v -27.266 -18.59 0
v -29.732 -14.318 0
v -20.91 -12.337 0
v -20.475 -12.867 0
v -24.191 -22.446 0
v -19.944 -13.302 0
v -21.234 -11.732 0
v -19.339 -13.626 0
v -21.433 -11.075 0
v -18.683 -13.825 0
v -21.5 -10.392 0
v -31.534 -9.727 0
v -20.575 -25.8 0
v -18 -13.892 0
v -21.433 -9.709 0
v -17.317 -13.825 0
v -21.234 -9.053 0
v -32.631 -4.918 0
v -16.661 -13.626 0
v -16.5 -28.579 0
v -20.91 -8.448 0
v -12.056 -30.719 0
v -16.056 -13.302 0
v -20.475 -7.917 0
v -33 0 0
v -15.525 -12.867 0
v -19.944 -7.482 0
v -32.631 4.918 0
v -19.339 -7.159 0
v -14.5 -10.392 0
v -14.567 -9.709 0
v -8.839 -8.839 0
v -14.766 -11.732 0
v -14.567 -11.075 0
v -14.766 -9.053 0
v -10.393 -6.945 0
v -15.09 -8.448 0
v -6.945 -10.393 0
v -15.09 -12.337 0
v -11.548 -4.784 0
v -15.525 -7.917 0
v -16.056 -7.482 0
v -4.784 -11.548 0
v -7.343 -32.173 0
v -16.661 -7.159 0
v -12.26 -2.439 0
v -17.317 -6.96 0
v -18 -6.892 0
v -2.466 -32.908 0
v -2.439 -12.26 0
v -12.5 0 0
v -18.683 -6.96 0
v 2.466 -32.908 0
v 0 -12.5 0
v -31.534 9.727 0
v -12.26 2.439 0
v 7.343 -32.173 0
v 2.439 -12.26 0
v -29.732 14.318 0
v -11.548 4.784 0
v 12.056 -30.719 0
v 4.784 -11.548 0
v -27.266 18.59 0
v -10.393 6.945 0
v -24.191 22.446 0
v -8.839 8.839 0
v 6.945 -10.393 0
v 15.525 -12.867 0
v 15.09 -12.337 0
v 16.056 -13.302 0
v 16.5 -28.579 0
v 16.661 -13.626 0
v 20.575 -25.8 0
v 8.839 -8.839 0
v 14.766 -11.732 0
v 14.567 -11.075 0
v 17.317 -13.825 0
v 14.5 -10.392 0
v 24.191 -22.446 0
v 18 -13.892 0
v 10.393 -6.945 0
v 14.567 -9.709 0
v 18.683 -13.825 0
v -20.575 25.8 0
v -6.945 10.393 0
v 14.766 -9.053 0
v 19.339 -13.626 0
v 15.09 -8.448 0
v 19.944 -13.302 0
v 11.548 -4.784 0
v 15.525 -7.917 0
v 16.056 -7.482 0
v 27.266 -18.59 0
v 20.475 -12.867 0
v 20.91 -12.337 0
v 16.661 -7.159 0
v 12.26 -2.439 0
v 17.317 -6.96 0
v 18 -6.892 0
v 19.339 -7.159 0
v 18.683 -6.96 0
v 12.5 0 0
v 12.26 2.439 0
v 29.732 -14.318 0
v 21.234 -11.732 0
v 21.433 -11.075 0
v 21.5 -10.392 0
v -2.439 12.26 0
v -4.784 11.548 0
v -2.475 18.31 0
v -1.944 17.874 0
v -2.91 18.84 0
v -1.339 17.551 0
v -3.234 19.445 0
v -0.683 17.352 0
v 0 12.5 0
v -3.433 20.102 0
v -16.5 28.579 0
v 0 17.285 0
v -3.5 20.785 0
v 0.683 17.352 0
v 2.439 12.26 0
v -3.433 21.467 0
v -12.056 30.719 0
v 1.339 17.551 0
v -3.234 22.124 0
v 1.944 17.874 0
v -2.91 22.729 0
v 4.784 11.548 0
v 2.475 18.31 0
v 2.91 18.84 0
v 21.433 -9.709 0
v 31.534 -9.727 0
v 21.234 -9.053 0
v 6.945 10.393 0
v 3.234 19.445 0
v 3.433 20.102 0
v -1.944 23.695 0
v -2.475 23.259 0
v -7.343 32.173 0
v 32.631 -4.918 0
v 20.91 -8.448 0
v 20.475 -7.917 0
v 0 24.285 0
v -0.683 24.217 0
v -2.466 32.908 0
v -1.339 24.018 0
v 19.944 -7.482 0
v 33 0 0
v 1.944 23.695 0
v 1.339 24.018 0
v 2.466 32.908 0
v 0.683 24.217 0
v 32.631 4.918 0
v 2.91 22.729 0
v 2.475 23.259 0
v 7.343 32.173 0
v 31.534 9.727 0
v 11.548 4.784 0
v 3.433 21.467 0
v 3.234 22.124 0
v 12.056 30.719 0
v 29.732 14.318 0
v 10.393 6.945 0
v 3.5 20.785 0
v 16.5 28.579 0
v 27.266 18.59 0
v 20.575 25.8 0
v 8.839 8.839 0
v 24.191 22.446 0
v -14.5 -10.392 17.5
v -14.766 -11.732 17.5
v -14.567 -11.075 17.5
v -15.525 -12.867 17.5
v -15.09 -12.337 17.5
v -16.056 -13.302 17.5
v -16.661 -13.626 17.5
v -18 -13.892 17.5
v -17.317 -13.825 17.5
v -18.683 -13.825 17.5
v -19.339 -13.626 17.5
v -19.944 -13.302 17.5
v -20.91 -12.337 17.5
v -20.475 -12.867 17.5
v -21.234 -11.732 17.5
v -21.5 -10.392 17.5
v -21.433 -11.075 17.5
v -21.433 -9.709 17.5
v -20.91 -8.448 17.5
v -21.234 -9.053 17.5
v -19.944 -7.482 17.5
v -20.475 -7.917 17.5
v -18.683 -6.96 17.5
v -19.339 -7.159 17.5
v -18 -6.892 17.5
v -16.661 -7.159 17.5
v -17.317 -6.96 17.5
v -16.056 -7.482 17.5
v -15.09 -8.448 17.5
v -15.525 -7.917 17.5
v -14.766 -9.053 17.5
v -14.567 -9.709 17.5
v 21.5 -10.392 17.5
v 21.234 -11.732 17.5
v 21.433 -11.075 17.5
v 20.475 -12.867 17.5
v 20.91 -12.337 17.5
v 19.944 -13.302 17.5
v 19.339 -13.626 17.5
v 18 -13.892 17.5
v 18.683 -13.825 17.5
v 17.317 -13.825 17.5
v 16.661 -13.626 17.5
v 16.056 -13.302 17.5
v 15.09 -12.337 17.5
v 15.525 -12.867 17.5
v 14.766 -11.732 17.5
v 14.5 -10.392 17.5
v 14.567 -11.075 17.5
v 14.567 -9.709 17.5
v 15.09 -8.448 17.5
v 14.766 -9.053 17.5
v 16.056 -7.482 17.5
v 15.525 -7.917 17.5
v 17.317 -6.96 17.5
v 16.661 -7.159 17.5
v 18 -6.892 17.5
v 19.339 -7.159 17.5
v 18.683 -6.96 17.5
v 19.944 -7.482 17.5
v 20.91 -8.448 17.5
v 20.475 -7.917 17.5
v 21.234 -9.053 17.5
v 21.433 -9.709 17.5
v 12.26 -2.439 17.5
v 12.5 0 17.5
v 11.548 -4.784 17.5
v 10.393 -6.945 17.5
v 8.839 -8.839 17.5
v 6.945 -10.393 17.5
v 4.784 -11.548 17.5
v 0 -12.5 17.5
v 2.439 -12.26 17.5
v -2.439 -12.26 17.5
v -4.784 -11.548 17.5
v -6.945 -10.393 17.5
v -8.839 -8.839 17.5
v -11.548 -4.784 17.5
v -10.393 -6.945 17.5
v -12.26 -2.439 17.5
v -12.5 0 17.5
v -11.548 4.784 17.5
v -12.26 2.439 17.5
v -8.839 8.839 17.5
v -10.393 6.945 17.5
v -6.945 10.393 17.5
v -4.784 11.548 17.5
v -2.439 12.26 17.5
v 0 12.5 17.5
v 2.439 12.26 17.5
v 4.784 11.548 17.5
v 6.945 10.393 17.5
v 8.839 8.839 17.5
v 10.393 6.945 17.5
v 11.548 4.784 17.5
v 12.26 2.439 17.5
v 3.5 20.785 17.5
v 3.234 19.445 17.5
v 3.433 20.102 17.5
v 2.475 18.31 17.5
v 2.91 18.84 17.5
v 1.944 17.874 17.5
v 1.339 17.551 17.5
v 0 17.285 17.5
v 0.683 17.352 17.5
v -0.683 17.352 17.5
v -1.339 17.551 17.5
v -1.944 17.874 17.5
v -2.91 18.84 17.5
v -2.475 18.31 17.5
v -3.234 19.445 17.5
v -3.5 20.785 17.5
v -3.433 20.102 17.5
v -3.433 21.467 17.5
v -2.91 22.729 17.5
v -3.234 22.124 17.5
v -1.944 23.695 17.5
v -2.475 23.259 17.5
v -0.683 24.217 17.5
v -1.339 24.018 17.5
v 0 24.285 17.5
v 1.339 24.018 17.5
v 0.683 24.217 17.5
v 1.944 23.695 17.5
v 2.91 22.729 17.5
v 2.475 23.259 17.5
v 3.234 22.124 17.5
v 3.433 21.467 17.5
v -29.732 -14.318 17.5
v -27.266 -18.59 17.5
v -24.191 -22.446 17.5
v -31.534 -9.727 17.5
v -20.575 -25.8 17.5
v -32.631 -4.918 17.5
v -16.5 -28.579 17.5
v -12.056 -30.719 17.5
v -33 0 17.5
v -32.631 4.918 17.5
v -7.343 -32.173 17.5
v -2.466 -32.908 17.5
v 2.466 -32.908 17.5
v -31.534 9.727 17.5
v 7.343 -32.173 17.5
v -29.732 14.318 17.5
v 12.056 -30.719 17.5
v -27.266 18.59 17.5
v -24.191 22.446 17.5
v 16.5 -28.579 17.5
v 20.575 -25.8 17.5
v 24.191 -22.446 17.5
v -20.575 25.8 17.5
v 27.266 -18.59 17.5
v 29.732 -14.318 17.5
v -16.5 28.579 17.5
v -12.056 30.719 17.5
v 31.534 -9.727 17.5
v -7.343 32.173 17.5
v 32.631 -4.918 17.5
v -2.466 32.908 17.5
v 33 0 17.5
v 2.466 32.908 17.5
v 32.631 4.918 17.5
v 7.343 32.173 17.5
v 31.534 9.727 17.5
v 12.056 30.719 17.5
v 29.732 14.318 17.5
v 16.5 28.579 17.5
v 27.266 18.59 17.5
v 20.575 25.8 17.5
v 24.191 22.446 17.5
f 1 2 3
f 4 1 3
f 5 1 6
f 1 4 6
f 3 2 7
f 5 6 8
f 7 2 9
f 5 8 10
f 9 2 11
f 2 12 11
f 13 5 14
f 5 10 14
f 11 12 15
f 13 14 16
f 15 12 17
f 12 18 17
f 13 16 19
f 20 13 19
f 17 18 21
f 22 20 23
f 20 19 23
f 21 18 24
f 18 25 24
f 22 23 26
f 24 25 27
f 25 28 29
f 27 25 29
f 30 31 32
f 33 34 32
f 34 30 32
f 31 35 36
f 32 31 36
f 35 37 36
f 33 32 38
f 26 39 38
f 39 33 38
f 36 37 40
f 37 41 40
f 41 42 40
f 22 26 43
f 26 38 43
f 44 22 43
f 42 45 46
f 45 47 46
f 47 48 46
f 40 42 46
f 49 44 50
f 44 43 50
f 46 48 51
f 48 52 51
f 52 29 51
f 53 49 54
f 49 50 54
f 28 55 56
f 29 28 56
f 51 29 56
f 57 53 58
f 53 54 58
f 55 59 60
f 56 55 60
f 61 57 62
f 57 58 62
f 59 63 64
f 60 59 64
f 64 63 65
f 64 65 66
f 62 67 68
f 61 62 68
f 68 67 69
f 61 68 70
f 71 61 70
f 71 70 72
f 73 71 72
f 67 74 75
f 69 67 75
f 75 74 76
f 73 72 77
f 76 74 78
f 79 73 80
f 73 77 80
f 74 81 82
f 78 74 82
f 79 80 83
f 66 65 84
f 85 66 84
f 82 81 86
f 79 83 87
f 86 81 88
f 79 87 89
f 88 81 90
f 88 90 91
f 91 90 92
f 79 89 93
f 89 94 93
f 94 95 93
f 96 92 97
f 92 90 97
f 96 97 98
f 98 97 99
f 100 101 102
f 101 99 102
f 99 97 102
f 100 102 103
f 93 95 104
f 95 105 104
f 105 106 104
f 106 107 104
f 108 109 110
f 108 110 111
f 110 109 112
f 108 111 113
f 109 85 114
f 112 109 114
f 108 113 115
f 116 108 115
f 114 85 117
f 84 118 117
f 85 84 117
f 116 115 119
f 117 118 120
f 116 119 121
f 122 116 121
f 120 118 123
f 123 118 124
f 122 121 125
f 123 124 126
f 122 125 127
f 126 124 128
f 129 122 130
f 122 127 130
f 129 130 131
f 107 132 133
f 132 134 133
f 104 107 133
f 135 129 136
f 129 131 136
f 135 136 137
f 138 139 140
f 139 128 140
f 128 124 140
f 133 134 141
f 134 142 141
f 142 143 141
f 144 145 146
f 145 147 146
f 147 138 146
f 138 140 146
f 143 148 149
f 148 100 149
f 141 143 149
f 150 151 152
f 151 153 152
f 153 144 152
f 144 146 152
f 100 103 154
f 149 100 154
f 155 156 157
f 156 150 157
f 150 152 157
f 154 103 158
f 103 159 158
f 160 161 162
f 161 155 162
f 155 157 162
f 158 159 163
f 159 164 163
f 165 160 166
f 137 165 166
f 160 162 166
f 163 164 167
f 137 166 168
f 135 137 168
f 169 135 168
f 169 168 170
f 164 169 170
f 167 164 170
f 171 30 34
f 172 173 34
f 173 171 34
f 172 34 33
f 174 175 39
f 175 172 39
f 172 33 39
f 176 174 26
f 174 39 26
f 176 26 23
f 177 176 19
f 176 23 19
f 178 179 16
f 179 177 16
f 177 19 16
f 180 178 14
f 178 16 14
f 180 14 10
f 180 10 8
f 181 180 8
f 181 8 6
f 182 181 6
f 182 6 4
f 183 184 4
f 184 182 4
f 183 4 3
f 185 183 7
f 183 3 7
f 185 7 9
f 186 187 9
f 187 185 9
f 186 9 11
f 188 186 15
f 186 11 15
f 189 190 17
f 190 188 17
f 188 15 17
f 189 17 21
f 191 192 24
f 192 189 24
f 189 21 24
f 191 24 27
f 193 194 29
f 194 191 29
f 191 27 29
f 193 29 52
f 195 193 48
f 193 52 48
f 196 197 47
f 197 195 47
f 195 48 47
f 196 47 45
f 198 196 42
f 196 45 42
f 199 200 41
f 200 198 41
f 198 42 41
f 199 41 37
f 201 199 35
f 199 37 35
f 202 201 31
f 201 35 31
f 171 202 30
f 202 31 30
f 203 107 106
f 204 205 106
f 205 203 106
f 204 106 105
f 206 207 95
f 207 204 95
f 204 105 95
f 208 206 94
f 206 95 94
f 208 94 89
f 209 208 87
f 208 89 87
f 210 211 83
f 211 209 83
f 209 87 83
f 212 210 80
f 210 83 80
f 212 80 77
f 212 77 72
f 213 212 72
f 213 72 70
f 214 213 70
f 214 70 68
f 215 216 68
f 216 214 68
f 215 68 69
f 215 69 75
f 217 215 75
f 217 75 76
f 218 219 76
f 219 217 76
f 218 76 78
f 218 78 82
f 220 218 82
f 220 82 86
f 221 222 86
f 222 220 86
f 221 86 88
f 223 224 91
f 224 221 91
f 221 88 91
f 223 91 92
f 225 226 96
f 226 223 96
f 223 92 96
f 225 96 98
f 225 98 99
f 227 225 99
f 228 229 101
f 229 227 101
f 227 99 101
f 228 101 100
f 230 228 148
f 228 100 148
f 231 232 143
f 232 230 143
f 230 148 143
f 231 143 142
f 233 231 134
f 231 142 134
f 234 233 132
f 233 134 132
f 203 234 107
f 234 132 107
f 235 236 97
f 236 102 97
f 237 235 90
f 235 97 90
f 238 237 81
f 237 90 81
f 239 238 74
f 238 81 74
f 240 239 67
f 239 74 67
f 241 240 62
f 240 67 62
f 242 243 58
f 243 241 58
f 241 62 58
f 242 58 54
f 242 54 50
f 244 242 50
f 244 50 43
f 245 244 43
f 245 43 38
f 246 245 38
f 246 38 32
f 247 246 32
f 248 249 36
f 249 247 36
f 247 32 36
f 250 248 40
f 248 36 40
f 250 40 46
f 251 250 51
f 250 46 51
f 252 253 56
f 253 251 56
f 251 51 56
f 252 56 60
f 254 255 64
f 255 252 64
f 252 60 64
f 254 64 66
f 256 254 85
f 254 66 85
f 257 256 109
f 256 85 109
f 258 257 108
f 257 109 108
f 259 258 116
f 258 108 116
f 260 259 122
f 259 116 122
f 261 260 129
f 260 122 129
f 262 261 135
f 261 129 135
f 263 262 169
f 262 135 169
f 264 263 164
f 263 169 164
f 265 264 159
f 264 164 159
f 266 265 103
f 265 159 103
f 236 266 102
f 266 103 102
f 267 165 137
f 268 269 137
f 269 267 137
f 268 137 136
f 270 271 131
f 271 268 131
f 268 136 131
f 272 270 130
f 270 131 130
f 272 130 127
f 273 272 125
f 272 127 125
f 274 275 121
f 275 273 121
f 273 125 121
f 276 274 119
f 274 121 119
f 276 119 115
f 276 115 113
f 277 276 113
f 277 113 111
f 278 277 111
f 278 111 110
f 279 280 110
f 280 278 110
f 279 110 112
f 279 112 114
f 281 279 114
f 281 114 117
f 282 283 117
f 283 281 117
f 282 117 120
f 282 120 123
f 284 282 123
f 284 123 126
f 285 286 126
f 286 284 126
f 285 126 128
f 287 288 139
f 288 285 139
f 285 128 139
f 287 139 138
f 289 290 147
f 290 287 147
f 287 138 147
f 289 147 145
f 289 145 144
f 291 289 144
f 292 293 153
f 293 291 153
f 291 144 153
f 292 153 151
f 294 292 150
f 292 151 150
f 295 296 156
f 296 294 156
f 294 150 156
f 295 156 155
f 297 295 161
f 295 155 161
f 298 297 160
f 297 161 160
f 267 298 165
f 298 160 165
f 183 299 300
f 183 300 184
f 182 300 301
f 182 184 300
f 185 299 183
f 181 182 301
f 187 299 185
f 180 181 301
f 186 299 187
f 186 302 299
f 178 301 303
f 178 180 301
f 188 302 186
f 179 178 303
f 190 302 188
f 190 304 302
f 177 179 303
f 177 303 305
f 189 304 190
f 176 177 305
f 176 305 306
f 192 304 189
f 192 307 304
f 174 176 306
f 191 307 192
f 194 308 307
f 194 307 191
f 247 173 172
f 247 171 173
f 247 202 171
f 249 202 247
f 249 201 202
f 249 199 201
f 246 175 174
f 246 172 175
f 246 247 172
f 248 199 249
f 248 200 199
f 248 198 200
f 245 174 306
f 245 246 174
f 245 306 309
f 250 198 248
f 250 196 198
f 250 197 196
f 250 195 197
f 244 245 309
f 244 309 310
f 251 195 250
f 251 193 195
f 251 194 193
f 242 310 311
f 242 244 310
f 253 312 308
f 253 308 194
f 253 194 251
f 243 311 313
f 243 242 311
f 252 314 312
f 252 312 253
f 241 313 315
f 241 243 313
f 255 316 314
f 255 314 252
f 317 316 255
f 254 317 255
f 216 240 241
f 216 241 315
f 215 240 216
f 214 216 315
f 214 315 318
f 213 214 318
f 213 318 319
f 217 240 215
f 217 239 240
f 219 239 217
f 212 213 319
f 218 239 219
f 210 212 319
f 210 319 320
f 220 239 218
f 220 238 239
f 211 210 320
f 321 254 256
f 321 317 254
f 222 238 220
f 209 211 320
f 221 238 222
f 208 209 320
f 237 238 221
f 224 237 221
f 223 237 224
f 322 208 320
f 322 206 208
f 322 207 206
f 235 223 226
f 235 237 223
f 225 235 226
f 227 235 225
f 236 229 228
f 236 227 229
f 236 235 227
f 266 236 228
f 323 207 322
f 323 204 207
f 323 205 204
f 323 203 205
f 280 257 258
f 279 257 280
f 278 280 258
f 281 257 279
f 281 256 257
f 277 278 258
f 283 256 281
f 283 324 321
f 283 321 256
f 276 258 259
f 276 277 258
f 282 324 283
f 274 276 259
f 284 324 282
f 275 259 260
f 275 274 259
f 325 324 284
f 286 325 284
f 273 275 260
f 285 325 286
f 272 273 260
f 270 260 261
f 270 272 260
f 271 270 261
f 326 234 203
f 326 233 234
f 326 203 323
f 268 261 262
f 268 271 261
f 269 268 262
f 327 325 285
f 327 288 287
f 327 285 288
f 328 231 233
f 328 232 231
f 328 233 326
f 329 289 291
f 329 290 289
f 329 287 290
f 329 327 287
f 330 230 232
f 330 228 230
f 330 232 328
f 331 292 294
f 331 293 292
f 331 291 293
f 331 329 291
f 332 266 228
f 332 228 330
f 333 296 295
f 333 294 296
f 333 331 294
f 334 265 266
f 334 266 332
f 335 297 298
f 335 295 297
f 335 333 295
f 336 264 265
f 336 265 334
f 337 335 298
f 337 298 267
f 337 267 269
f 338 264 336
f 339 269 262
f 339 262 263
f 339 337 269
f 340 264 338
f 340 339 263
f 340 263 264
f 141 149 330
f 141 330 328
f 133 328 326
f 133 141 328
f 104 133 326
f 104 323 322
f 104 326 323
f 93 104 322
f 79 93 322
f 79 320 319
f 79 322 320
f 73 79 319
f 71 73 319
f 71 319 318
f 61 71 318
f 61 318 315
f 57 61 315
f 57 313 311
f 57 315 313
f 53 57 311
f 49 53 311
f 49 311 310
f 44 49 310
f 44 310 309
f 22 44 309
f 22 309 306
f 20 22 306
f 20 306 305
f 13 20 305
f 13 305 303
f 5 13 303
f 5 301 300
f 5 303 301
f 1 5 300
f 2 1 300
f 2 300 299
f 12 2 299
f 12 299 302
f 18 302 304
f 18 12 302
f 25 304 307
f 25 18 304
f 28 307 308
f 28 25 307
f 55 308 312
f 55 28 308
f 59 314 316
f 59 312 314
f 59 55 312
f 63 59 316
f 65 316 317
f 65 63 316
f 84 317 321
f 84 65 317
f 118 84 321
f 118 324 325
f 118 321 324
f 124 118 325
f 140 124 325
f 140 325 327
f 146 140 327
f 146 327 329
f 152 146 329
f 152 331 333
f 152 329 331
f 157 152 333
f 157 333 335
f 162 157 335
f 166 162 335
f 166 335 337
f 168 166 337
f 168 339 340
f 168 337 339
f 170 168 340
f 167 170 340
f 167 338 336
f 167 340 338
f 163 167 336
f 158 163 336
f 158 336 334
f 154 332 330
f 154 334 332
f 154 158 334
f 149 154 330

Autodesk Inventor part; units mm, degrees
ref_plane "YZ Plane" through (0, 0, 0) normal (1, 0, 0) x (0, 1, 0)
ref_plane "XZ Plane" through (0, 0, 0) normal (0, 1, 0) x (-1, 0, 0)
sketch "Sketch1" plane through (0, 0, 0) normal (0, 0, 1) x (1, 0, 0)
  circle A0 centre (0, 20.7846) radius 3.5 projected
  circle A1 centre (-18, -10.3923) radius 3.5 projected
  circle A2 centre (18, -10.3923) radius 3.5 projected
  circle A3 centre (0, 0) radius 6.75 construction
  circle A4 centre (0, 0) radius 12.5
  circle A5 centre (0, 0) radius 33 projected
  point P0 (0, 0)
  dimension "d0" = 25
ref_plane "Work Plane1" through (-191.7635, -303.2503, 17.5) normal (0, 0, -1) x (-0.1566, 0.9877, 0)
extrude "Extrusion1" add sketch "Sketch1" along normal up to surface (17.5 mm away)
properties part number "LegMotorSpacer"
